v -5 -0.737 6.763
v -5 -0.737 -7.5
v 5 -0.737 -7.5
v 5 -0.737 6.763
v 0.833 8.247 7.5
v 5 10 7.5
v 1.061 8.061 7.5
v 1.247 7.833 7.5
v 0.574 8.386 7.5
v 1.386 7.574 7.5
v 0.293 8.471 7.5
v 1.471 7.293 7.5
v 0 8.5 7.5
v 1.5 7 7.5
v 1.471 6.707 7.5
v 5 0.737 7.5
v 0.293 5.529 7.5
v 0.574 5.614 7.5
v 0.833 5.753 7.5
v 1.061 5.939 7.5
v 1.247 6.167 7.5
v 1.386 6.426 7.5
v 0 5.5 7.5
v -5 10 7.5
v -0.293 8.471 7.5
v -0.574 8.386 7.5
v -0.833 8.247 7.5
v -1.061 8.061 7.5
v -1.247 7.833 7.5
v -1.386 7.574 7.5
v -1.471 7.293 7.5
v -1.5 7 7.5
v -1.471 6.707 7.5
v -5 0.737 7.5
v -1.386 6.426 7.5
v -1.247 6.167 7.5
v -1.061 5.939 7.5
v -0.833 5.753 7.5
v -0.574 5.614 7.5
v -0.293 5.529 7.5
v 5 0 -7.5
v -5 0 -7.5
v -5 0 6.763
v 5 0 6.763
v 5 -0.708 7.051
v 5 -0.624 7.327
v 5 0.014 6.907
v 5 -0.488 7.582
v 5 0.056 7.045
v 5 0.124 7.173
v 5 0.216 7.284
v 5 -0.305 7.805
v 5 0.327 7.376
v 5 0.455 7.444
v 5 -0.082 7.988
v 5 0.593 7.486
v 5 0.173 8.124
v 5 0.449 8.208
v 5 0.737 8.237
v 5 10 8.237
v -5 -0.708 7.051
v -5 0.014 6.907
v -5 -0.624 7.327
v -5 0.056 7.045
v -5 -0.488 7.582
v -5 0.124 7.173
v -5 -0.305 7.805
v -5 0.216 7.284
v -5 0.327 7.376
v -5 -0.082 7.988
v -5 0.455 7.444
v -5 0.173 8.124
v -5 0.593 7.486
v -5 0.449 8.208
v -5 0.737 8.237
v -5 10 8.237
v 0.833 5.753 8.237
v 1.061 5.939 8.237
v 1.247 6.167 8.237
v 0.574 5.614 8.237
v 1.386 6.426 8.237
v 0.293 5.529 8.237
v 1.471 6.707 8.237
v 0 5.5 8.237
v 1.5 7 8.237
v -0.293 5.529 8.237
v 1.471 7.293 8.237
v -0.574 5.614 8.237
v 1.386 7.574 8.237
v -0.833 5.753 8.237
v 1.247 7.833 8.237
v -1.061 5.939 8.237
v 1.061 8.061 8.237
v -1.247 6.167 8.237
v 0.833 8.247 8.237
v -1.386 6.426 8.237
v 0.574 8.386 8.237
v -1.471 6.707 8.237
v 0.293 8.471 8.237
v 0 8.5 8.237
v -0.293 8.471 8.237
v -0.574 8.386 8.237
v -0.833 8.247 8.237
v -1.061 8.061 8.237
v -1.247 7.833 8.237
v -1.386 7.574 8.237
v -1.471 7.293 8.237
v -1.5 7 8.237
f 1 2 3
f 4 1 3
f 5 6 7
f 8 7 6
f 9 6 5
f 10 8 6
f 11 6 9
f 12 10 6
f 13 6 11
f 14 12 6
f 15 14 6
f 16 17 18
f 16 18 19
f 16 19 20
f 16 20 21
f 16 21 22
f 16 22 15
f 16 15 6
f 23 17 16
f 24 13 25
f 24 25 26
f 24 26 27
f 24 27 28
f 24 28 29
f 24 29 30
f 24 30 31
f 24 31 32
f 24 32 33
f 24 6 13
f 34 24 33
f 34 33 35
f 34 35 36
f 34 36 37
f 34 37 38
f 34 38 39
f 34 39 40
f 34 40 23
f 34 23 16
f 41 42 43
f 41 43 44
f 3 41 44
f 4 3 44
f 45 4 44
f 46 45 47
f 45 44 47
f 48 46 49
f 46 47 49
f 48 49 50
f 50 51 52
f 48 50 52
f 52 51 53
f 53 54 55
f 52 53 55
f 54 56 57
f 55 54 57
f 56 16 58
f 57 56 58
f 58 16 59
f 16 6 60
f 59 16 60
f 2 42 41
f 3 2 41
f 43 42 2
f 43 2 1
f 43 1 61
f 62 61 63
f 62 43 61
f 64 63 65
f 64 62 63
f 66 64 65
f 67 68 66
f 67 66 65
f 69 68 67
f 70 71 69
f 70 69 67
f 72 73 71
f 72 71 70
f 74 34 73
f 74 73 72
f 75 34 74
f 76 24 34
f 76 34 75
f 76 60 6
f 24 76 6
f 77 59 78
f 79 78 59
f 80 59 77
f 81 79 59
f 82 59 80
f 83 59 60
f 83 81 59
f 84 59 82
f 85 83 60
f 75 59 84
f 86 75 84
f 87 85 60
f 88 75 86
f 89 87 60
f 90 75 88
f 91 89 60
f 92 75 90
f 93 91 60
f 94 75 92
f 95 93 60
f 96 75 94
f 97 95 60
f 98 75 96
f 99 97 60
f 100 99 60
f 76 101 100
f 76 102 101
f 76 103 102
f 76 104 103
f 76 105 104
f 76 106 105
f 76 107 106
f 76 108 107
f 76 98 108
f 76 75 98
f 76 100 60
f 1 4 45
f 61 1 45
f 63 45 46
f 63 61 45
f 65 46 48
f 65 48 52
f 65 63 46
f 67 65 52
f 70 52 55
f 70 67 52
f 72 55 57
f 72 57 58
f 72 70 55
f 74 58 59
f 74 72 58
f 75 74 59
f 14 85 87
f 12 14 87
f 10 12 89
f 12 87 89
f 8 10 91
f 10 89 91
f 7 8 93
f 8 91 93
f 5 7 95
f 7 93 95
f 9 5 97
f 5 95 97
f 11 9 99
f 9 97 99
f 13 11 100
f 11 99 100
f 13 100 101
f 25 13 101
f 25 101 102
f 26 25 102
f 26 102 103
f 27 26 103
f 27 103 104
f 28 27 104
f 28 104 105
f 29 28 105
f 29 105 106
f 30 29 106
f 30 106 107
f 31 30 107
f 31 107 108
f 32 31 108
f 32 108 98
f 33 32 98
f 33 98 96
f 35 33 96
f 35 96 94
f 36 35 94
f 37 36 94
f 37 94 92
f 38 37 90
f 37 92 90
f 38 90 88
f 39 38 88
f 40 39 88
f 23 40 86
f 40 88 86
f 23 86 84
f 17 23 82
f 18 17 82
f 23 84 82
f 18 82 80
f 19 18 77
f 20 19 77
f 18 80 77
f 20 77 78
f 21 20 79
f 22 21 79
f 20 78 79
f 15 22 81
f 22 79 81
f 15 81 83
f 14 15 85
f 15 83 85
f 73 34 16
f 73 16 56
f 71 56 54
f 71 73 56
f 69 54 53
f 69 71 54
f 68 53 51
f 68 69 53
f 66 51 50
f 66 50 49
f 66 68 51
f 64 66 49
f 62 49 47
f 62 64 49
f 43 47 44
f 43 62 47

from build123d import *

# Parameters (mm, degrees)
CROQUIS1_W                       = 10
CROQUIS1_H                       = 15
BRIDA_BASE1_DEPTH                = 0.7366
BRIDA_DE_ARISTA1_STRIP_W         = 4.4196
BRIDA_DE_ARISTA1_STRIP_H         = 0.7366
BRIDA_DE_ARISTA1_STRIP_CUT_DEPTH = 10
BRIDA_DE_ARISTA1_DEPTH           = 10
CROQUIS7_R                       = 1.5
CORTAR_EXTRUIR1_DEPTH            = 10


# Sheet-metal steps are written as plain solids
with BuildPart() as part:
    # Croquis1 → Brida base1 (new body)
    with BuildSketch(Plane(origin=(0, 0, 0), x_dir=(1, 0, 0), z_dir=(0, 1, 0))):
        Rectangle(CROQUIS1_W, CROQUIS1_H)
    extrude(amount=-BRIDA_BASE1_DEPTH)

    # Brida de arista1 strip (across the edge) → Brida de arista1 strip cut (cut)
    with BuildSketch(Plane(origin=(-5, 0, 7.5), x_dir=(0, 0, -1), z_dir=(1, 0, 0))):
        with Locations((-1.4732, -0.3683)):
            Rectangle(BRIDA_DE_ARISTA1_STRIP_W, BRIDA_DE_ARISTA1_STRIP_H)
    extrude(amount=BRIDA_DE_ARISTA1_STRIP_CUT_DEPTH, mode=Mode.SUBTRACT)

    # Brida de arista1 section (across the edge) → Brida de arista1 (add)
    with BuildSketch(Plane(origin=(-5, 0, 7.5), x_dir=(0, 0, -1), z_dir=(1, 0, 0))):
        with BuildLine():
            Line((-0.7366, 0.7366), (-0.7366, 10))
            Line((-0.7366, 10), (0, 10))
            Line((0, 10), (0, 0.7366))
            ThreePointArc((0, 0.7366), (0.215745145, 0.215745145), (0.7366, 0))
            Line((0.7366, 0), (0.7366, -0.7366))
            ThreePointArc((0.7366, -0.7366), (-0.30510971, -0.30510971), (-0.7366, 0.7366))
        make_face()
    extrude(amount=BRIDA_DE_ARISTA1_DEPTH)

    # Croquis7 → Cortar-Extruir1 (cut)
    with BuildSketch(Plane.XY.offset(8.2366)):
        with Locations((0, 7)):
            Circle(CROQUIS7_R)
    extrude(amount=-CORTAR_EXTRUIR1_DEPTH, mode=Mode.SUBTRACT)


solid = part.part
